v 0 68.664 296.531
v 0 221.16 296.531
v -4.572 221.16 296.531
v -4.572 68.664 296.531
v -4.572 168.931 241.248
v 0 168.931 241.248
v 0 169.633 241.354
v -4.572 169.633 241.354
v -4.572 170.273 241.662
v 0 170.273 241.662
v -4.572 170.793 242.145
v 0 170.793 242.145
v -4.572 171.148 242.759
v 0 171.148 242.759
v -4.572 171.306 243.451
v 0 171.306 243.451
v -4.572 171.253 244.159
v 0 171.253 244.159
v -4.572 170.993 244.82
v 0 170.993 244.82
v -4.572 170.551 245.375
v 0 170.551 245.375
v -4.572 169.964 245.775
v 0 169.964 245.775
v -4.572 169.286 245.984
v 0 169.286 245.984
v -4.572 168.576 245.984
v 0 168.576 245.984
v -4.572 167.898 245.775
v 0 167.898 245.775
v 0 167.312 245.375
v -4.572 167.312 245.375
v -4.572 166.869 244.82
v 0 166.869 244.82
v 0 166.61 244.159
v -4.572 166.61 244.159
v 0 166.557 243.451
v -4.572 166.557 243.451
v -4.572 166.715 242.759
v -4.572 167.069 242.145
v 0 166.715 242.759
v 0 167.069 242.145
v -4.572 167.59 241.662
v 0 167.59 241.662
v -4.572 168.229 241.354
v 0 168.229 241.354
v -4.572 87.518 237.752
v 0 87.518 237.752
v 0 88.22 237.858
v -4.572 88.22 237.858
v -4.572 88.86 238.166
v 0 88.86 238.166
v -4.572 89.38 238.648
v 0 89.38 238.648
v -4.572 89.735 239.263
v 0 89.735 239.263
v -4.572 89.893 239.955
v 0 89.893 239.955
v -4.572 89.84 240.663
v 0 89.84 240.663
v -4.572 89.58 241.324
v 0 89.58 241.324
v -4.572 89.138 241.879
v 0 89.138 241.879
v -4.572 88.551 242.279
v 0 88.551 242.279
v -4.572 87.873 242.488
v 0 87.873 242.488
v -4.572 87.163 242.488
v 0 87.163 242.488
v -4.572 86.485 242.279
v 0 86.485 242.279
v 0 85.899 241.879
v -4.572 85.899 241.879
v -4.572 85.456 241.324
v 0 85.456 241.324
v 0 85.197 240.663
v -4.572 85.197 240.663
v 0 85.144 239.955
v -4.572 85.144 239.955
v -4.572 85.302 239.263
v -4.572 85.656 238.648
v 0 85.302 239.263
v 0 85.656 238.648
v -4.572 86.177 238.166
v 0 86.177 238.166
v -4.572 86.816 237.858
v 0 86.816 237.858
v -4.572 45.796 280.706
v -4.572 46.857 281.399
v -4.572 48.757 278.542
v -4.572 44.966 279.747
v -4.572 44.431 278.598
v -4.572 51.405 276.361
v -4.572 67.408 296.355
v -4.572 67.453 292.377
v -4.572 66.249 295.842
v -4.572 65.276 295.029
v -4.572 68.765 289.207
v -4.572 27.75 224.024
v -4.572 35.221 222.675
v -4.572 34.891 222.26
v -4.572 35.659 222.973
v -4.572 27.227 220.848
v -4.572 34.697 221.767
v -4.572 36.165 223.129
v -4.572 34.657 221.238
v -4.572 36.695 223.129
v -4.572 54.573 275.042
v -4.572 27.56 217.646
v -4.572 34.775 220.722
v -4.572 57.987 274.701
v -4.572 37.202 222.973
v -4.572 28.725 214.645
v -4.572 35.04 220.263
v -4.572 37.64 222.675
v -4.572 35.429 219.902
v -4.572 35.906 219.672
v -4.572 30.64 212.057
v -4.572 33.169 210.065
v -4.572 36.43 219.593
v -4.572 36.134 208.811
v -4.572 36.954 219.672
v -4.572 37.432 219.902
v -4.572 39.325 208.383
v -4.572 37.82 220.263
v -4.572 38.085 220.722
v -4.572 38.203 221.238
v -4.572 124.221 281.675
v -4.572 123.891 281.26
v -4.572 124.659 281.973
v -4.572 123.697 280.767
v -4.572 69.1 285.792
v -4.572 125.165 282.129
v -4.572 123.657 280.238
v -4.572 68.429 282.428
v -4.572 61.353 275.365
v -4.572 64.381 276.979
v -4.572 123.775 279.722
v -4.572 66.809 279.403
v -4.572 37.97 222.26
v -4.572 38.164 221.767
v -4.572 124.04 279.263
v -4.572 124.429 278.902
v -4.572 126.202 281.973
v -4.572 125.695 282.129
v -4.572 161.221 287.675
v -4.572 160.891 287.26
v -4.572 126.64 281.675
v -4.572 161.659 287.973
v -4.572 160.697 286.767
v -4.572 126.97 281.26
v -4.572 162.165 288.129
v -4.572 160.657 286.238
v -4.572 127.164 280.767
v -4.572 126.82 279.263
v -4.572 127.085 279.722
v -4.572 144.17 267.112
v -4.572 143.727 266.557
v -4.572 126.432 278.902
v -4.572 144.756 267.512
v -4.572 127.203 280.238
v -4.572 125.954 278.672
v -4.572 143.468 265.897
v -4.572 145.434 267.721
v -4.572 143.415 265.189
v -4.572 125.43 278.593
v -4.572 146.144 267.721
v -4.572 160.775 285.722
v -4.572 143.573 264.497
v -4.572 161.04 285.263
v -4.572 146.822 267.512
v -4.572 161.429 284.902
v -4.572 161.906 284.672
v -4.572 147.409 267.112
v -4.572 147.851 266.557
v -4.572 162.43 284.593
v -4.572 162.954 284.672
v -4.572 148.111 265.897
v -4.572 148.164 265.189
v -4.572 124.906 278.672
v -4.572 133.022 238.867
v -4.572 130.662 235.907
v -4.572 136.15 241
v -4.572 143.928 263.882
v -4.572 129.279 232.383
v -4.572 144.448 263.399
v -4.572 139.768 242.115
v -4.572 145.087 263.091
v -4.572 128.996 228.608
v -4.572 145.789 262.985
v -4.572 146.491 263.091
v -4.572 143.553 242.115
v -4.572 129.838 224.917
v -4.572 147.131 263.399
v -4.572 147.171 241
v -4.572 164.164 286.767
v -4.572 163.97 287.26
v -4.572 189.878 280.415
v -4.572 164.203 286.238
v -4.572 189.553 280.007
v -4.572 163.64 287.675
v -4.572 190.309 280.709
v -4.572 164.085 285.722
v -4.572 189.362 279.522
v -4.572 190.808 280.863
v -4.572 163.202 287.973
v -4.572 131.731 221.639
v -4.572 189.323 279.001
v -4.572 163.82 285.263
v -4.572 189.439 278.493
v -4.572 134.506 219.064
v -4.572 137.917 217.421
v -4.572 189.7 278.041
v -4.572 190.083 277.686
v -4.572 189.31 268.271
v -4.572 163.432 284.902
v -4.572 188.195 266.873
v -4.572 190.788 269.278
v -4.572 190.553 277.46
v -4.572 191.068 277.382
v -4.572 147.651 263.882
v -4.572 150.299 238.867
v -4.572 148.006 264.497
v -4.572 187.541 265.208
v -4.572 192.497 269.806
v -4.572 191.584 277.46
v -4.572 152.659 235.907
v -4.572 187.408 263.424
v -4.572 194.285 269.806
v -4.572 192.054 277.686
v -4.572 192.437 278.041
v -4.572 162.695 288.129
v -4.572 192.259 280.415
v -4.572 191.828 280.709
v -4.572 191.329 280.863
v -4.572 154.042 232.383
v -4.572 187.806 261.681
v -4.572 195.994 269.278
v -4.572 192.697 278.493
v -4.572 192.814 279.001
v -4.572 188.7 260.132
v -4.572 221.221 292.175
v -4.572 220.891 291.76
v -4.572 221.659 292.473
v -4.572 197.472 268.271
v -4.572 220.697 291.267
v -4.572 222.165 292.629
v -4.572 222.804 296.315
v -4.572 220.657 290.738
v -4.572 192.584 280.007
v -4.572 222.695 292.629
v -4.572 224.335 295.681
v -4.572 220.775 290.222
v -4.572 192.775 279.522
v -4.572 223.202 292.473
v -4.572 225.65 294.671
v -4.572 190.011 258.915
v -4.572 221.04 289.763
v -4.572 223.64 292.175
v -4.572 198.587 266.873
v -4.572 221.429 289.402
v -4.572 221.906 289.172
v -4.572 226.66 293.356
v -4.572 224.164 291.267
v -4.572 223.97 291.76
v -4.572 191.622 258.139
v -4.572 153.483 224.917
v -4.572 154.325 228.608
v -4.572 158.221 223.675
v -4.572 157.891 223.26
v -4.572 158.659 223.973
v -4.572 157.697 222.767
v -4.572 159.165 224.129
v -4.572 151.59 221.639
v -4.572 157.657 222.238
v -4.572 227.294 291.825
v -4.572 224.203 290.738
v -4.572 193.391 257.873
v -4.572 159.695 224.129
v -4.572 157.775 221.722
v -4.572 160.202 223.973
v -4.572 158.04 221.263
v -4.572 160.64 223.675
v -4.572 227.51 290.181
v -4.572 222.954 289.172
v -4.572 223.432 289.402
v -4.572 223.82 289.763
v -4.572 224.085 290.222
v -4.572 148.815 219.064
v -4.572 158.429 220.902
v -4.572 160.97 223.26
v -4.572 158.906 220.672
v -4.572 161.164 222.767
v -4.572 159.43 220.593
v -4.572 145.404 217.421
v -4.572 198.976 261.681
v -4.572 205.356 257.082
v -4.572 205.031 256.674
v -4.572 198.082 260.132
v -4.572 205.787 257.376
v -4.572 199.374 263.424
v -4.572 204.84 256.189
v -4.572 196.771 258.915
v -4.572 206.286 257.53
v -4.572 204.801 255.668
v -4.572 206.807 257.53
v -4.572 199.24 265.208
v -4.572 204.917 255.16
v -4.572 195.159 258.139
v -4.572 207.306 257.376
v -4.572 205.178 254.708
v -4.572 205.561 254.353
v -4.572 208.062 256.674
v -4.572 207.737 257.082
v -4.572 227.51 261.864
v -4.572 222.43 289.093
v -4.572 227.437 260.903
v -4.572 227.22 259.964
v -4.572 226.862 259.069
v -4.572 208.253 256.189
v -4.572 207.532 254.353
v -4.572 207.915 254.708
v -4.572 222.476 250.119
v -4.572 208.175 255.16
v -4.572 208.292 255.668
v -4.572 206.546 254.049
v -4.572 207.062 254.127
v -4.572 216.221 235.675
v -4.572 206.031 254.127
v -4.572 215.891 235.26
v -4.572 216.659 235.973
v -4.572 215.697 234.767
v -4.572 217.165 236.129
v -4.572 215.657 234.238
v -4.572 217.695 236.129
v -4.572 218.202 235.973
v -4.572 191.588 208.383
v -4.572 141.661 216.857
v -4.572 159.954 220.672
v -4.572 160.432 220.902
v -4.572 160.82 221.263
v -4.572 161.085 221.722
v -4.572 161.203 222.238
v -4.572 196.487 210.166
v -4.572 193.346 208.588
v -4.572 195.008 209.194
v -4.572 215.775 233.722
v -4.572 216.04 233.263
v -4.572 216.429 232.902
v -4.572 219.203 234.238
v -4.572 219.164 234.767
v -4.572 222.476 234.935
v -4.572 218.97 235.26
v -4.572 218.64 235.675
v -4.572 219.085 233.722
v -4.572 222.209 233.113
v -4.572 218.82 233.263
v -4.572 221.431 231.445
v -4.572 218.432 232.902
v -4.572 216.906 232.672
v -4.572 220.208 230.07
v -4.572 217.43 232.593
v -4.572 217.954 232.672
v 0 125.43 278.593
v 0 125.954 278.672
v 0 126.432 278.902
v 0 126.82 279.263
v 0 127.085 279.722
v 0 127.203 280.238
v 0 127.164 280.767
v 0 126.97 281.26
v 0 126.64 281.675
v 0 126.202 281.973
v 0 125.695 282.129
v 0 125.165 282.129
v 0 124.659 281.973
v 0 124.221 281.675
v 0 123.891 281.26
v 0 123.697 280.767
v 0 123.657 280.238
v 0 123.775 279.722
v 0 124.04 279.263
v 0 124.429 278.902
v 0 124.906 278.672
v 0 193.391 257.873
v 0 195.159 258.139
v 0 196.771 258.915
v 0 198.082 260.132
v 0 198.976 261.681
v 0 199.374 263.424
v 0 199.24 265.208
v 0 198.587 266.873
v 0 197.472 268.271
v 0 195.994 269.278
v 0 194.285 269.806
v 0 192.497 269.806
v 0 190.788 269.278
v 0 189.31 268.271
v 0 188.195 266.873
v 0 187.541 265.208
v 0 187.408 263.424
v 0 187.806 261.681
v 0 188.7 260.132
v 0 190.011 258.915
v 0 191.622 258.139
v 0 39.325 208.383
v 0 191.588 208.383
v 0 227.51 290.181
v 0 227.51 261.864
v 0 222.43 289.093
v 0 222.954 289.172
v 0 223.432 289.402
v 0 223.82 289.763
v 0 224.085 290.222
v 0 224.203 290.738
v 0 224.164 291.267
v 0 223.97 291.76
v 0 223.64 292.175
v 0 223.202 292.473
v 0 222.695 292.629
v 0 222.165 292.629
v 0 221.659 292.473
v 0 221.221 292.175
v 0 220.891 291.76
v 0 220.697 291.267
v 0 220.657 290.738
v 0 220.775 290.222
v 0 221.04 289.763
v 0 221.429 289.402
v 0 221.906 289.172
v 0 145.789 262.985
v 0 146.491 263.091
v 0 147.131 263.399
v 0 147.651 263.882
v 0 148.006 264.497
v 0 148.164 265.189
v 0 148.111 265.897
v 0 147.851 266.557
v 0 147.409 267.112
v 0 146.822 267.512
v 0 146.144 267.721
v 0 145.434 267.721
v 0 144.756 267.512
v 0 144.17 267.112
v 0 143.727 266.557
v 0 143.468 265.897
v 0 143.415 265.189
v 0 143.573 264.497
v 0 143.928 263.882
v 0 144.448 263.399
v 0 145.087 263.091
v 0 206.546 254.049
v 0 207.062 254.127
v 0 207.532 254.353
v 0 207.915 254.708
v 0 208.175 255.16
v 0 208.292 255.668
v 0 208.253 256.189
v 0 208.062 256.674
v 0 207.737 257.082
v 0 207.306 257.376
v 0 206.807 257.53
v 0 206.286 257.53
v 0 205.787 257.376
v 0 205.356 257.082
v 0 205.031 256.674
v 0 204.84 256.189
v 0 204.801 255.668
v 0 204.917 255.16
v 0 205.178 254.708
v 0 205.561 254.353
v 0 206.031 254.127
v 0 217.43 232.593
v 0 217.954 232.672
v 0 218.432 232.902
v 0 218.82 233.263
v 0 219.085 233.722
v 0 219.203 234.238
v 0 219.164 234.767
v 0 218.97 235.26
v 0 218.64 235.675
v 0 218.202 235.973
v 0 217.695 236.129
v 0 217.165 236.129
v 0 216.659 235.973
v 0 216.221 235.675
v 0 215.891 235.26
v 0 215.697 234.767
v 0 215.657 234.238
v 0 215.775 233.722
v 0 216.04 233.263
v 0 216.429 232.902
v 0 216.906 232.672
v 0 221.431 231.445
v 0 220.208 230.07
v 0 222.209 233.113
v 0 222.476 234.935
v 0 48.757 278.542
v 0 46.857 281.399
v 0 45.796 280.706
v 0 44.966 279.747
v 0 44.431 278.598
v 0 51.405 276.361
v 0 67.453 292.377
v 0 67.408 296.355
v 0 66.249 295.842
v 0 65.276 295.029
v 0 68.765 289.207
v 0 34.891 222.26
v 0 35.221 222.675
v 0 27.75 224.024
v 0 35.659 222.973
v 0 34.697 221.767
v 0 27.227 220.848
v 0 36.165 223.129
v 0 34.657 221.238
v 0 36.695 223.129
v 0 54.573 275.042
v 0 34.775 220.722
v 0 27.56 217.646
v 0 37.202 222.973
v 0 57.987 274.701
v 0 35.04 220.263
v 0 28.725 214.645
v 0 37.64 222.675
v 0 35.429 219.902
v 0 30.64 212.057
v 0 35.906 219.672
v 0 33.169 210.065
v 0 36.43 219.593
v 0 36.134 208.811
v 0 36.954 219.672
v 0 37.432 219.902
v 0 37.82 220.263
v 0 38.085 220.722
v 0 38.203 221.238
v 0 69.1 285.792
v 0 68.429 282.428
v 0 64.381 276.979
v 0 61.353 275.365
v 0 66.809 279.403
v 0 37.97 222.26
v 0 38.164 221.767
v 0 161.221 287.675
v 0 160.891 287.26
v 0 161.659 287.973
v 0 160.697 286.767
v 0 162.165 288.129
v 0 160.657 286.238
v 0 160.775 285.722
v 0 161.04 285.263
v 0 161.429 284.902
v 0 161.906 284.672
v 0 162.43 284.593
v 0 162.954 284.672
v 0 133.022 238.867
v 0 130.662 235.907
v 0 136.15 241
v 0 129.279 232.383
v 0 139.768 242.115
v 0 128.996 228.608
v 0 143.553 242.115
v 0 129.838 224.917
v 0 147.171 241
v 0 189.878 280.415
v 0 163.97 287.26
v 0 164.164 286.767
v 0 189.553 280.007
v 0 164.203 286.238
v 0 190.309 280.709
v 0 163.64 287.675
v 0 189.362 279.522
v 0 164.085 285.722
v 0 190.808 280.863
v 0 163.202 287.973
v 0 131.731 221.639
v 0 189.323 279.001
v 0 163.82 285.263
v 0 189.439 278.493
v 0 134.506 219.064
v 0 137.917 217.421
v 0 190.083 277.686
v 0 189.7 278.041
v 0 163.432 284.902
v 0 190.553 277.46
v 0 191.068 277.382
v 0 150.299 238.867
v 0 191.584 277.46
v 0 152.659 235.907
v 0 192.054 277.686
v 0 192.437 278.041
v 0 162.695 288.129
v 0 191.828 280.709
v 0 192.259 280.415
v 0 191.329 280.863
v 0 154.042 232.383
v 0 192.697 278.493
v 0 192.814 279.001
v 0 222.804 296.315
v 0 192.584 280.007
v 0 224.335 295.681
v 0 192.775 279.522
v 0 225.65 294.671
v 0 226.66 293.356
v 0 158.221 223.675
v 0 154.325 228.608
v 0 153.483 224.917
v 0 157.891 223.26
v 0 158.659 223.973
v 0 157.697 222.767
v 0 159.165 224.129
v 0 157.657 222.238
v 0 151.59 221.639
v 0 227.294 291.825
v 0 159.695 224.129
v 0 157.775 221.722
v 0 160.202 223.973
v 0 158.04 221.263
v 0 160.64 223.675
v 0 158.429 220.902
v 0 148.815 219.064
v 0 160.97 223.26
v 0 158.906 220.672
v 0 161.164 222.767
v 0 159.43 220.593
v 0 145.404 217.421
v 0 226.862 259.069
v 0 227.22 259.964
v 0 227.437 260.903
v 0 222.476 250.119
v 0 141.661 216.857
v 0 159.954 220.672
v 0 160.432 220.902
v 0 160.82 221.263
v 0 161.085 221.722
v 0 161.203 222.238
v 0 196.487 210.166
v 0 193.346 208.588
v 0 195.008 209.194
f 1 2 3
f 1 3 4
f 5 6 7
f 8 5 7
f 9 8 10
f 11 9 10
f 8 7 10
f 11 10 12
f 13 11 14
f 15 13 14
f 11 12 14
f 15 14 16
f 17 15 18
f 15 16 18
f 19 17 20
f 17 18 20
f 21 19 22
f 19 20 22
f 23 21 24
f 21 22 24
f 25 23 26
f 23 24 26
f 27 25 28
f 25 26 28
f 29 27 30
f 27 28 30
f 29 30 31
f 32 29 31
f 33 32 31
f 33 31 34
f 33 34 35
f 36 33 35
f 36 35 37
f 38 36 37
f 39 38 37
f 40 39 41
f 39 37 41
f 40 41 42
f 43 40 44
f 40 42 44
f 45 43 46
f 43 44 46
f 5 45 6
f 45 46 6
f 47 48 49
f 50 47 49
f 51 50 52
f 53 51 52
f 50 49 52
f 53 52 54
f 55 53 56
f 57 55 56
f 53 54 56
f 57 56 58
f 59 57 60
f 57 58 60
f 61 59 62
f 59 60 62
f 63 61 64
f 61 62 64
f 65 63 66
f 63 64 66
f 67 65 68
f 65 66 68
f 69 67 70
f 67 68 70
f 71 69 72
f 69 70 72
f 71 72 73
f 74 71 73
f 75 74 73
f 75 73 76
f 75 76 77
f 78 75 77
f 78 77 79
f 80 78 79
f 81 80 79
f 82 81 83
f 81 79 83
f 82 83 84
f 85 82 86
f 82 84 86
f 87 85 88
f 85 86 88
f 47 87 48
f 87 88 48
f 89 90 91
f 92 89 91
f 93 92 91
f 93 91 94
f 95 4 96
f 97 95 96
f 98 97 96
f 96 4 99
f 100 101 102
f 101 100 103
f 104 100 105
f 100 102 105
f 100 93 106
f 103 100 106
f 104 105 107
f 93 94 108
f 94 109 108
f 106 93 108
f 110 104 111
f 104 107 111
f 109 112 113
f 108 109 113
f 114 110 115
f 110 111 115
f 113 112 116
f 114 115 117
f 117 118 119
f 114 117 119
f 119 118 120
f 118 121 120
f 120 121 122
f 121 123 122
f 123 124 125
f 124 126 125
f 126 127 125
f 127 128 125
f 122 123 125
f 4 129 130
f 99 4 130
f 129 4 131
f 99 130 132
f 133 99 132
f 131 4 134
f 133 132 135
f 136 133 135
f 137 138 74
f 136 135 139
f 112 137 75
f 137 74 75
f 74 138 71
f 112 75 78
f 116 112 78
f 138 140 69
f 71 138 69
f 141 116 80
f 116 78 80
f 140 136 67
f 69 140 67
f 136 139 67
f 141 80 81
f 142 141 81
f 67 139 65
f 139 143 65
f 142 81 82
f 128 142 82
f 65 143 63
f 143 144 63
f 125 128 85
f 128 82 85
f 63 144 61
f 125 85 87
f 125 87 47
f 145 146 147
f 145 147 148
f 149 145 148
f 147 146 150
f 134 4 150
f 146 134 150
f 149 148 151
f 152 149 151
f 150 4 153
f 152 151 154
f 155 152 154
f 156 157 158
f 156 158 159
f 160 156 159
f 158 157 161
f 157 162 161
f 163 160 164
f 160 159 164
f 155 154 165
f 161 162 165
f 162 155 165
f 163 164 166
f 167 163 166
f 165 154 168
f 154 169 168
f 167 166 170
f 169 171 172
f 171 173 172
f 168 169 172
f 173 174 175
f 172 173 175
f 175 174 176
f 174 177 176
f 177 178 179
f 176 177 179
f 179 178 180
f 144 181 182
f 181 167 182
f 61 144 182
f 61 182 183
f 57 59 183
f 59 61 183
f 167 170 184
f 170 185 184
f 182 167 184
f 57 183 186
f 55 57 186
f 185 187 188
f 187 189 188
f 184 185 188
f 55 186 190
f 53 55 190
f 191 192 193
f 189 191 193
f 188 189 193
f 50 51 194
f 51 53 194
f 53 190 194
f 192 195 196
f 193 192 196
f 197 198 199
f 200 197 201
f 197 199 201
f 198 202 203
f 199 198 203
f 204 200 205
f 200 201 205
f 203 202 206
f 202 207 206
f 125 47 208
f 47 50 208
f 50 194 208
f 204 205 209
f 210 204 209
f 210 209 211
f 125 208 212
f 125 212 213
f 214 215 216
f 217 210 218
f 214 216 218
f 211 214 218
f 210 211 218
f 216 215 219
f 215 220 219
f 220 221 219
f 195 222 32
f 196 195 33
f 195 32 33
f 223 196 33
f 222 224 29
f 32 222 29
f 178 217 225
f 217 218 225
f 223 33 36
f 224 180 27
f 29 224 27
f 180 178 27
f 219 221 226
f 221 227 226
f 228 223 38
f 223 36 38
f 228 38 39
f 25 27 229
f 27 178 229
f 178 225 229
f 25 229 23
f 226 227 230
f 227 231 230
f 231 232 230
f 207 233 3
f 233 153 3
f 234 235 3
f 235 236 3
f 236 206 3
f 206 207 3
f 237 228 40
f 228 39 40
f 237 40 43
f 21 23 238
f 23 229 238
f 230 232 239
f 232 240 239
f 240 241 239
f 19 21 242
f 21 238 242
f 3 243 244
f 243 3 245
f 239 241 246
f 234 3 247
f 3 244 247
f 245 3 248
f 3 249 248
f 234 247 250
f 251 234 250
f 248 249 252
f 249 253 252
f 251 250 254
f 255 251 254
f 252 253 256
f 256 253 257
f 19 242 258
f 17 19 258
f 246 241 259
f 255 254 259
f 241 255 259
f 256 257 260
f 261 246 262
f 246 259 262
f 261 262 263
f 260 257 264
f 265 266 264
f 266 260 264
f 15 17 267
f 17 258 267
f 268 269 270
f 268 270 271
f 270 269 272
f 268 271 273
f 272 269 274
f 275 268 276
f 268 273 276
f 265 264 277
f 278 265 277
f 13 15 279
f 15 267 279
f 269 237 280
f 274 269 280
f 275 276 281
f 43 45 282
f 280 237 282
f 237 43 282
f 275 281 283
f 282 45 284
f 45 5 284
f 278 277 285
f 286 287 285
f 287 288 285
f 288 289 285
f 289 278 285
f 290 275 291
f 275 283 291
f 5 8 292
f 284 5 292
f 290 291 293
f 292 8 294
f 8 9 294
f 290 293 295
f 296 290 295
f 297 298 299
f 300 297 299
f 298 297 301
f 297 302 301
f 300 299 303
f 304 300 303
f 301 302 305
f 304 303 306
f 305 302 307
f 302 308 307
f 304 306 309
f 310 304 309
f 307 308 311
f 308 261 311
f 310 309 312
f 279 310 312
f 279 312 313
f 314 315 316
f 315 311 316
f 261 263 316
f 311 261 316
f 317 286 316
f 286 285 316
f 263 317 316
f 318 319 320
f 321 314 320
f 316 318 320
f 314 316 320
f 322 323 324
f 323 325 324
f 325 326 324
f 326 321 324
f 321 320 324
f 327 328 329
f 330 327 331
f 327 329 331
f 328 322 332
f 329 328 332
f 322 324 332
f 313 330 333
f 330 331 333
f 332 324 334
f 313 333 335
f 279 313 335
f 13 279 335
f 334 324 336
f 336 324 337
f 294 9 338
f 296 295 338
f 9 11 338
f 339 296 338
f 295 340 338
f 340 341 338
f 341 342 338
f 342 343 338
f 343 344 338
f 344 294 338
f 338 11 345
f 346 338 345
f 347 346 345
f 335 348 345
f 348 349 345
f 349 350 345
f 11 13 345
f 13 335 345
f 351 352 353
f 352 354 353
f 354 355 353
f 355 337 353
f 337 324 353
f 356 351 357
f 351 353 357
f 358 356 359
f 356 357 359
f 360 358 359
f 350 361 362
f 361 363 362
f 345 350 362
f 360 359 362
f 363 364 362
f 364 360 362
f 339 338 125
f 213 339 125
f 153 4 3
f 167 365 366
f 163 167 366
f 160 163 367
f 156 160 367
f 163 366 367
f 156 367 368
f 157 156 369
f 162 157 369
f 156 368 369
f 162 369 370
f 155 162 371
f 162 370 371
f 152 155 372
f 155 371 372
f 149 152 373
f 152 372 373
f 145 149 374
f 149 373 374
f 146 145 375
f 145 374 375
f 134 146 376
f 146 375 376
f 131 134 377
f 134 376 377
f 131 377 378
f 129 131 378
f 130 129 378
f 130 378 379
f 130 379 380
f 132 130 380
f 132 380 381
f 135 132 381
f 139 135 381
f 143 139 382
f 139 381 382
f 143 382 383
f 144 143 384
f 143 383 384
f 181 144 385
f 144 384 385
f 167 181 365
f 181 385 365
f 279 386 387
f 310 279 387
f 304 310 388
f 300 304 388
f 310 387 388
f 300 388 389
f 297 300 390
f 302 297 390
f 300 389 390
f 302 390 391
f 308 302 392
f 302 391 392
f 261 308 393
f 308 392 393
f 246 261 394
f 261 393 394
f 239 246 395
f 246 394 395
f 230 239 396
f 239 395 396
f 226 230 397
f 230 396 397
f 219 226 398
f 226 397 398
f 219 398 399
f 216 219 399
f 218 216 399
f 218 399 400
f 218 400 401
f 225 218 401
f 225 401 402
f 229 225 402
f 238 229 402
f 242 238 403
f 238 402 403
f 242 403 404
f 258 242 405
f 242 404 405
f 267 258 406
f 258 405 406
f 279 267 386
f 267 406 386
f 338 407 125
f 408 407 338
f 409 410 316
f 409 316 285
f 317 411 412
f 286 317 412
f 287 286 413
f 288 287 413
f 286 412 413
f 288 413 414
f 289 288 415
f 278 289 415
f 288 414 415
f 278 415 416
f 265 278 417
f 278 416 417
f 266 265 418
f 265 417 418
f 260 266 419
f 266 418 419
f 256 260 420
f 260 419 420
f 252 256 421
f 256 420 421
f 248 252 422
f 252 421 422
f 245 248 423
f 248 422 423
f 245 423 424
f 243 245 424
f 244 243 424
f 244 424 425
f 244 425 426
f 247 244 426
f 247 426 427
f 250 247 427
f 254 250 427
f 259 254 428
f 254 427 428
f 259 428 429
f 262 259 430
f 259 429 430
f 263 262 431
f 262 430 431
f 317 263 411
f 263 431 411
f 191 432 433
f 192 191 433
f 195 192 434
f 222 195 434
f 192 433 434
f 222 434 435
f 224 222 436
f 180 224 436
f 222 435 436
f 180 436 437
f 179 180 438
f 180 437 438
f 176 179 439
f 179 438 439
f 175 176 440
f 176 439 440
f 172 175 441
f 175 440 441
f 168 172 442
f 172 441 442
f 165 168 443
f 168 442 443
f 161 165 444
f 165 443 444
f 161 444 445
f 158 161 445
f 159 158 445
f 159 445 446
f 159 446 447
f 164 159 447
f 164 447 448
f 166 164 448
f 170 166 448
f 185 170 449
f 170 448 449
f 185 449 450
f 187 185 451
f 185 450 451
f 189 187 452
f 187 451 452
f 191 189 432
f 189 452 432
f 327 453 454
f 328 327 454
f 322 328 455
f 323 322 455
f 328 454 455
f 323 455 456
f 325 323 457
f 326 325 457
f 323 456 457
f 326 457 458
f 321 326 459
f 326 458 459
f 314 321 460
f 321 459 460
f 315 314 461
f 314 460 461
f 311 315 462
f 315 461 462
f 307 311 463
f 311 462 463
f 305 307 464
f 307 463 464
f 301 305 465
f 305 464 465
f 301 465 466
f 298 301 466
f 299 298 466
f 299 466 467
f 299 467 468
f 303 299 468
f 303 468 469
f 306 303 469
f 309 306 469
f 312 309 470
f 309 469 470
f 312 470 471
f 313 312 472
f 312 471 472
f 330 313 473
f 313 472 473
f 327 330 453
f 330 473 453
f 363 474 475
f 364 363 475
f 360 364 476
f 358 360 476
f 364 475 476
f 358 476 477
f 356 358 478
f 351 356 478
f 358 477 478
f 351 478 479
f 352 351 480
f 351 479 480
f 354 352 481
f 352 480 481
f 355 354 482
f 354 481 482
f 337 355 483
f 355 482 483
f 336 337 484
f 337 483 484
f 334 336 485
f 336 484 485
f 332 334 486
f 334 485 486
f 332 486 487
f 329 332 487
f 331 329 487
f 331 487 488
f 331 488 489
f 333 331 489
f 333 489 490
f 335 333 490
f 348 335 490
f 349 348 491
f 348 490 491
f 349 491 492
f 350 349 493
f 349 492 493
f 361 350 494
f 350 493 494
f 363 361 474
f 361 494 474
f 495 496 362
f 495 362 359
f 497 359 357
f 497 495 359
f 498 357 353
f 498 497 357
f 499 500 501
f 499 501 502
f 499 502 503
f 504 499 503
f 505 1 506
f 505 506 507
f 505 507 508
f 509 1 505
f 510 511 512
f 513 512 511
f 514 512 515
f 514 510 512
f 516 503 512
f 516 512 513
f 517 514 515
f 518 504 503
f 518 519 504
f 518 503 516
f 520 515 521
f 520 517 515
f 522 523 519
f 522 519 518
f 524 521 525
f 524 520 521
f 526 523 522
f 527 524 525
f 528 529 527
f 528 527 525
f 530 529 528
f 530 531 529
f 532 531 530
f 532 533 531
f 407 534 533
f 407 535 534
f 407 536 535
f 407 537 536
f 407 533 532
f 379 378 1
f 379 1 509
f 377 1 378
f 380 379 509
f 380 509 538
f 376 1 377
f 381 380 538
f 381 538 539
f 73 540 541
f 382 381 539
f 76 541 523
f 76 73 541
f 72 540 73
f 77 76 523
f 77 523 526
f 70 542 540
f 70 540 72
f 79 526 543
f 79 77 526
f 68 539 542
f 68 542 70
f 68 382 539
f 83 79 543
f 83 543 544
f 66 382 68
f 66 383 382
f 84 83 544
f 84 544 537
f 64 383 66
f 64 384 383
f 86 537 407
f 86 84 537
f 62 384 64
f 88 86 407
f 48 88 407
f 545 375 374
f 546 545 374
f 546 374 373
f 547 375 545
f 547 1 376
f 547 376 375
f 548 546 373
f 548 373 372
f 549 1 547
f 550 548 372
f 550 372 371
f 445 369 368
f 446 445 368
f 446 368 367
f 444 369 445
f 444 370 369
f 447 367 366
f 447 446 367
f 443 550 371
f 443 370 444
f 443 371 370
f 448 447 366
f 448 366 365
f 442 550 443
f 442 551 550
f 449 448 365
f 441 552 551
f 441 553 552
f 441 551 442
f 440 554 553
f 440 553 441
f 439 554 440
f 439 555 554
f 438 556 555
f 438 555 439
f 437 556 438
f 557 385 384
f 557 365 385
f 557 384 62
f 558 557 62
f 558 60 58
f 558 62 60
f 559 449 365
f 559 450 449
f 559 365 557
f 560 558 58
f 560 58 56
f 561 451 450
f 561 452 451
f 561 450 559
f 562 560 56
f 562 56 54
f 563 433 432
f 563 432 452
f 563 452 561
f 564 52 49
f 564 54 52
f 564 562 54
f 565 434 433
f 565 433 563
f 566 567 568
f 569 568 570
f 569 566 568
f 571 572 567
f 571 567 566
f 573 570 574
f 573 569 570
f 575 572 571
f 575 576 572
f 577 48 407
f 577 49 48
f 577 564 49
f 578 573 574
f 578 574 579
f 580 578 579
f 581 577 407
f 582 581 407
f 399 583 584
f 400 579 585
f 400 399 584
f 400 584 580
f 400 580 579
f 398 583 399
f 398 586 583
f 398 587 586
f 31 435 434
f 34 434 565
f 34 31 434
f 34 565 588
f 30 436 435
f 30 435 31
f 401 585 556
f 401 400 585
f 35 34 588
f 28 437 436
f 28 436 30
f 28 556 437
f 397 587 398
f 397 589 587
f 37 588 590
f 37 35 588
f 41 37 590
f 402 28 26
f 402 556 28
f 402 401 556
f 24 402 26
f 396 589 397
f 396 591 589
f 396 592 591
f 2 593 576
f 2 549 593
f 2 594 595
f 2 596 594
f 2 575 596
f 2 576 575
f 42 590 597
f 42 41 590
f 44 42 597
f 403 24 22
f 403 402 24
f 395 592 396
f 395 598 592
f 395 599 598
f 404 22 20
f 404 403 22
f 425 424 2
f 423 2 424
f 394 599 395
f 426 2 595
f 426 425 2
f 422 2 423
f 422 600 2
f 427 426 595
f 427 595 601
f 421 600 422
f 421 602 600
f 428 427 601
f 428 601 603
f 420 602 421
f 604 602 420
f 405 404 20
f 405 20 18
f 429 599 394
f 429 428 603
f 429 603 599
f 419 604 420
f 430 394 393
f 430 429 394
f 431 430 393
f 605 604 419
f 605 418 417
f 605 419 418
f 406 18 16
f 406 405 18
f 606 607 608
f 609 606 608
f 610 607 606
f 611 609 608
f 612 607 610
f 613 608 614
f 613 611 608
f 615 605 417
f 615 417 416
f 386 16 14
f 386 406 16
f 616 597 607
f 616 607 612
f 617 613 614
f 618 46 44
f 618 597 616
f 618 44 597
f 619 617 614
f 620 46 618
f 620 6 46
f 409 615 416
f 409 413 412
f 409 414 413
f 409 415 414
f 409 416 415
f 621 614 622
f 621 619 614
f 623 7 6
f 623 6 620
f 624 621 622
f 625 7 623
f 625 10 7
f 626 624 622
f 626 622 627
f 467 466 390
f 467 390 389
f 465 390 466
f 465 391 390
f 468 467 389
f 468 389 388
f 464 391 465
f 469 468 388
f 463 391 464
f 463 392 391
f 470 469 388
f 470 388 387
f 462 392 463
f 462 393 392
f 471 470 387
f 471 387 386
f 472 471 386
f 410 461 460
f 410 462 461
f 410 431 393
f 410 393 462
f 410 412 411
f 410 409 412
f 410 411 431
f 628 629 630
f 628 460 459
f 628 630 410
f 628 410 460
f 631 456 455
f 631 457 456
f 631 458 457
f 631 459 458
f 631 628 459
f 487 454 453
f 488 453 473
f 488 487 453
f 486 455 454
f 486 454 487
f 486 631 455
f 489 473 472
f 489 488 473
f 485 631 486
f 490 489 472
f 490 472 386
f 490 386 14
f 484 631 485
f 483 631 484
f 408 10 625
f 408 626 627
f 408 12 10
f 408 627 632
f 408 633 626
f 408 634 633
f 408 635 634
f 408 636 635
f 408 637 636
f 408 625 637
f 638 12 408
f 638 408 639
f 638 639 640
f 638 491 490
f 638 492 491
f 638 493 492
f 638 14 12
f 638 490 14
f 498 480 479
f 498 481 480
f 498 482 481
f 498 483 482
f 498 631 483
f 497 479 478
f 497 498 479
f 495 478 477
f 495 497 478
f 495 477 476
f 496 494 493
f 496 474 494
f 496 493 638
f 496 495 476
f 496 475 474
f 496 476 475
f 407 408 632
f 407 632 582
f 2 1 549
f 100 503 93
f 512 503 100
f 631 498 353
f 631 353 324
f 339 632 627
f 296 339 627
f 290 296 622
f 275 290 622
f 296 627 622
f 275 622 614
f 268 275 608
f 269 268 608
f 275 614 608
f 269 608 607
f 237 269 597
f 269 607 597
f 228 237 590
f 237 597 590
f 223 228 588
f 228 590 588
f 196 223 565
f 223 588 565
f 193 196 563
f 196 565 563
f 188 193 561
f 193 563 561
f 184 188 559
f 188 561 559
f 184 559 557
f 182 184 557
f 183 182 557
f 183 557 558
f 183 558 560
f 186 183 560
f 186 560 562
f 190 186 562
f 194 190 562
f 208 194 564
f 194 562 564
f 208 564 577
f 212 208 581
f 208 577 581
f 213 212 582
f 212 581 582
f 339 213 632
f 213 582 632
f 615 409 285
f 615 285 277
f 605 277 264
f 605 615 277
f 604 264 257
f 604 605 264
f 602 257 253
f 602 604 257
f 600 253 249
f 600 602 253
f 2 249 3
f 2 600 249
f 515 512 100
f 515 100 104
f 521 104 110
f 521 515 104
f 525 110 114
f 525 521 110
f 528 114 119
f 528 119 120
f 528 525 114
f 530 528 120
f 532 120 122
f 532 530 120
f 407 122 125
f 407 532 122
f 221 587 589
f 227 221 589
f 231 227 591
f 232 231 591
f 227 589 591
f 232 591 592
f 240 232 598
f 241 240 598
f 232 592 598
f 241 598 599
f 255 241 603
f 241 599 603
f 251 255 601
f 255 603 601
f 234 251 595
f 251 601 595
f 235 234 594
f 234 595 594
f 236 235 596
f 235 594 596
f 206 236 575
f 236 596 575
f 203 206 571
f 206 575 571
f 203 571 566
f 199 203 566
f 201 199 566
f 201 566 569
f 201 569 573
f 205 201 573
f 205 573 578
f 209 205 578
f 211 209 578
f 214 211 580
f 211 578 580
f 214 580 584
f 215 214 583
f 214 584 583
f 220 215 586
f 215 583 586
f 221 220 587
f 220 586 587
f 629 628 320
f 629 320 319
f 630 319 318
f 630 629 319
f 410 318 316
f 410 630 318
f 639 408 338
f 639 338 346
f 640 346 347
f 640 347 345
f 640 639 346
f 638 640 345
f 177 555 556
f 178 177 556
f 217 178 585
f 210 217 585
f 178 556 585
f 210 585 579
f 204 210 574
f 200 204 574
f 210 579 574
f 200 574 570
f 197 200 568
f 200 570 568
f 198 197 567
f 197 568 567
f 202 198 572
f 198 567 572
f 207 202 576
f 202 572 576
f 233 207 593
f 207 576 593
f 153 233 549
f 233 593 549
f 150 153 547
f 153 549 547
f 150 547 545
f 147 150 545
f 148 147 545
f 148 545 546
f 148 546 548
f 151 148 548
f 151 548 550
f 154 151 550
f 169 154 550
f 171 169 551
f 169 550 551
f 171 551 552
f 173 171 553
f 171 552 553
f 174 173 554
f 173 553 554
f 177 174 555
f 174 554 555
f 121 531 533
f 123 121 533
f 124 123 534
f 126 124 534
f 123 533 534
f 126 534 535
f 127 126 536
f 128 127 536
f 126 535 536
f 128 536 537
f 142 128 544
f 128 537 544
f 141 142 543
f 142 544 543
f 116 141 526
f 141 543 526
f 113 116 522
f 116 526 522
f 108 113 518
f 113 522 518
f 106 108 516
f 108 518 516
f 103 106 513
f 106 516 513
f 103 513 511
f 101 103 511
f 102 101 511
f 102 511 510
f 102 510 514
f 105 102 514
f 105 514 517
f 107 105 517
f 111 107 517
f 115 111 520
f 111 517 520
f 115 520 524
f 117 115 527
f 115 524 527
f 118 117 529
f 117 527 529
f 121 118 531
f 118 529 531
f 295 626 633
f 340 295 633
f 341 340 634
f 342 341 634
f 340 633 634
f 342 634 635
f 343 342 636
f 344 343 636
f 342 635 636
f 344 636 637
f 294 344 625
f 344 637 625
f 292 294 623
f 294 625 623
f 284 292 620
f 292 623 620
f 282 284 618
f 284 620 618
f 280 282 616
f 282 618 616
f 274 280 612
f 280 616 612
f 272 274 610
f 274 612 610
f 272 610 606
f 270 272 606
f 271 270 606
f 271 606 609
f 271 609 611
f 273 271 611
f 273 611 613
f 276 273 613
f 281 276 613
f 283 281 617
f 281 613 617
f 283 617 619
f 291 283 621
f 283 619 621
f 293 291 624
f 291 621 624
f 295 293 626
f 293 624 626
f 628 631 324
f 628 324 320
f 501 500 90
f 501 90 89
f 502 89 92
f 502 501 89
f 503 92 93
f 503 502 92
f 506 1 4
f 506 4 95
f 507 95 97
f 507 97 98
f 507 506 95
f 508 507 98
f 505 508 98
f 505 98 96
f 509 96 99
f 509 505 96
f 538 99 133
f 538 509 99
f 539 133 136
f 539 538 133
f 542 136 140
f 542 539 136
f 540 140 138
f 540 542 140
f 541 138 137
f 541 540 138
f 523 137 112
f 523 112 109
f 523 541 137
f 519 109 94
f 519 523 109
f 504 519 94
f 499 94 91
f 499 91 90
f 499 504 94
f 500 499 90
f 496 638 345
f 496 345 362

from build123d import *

# Parameters (mm, degrees)
SKETCH4_R           = 12.7
SKETCH4_R_2         = 1.778
SKETCH4_R_3         = 2.38125
SKETCH4_R_4         = 1.75
SKETCH4_R_5         = 6
BOSS_EXTRUDE1_DEPTH = 4.572


with BuildPart() as part:
    # Sketch4 → Boss-Extrude1 (new body)
    with BuildSketch(Plane(origin=(0, 0, 0), x_dir=(0, 0, -1), z_dir=(1, 0, 0))):
        with BuildLine():
            Line((-278.598048041, 44.43052094), (-224.024344082, 27.750173837))
            ThreePointArc((-224.024344082, 27.750173837), (-213.286752868, 29.595855882), (-208.38308557, 39.325010744))
            Line((-208.38308557, 39.325010744), (-208.38308557, 191.588495768))
            ThreePointArc((-208.38308557, 191.588495768), (-208.8426278, 194.19468926), (-210.165826914, 196.486537353))
            Line((-210.165826914, 196.486537353), (-230.07024685, 220.207701322))
            ThreePointArc((-230.07024685, 220.207701322), (-232.251003102, 221.881054448), (-234.934629064, 222.476))
            Line((-234.934629064, 222.476), (-250.119258716, 222.476))
            Line((-250.119258716, 222.476), (-259.069094553, 226.862369804))
            ThreePointArc((-259.069094553, 226.862369804), (-260.42931468, 227.346249494), (-261.863679558, 227.510370624))
            Line((-261.863679558, 227.510370624), (-290.181258716, 227.510370624))
            ThreePointArc((-290.181258716, 227.510370624), (-294.671386777, 225.650498684), (-296.531258716, 221.160370624))
            Line((-296.531258716, 221.160370624), (-296.531258716, 68.663949573))
            ThreePointArc((-296.531258716, 68.663949573), (-296.13893545, 66.810982655), (-295.029296163, 65.276021876))
            ThreePointArc((-295.029296163, 65.276021876), (-276.979257712, 64.380634873), (-281.39899141, 46.857177452))
            ThreePointArc((-281.39899141, 46.857177452), (-280.255414168, 45.347331423), (-278.598048041, 44.43052094))
        make_face()
        with Locations((-229.557259723, 141.660587995)):
            Circle(SKETCH4_R, mode=Mode.SUBTRACT)
        with Locations((-221.371258716, 36.430370624)):
            Circle(SKETCH4_R_2, mode=Mode.SUBTRACT)
        with Locations((-243.629318942, 168.931188955)):
            Circle(SKETCH4_R_3, mode=Mode.SUBTRACT)
        with Locations((-280.371258716, 125.430370624)):
            Circle(SKETCH4_R_2, mode=Mode.SUBTRACT)
        with Locations((-286.371258716, 162.430370624)):
            Circle(SKETCH4_R_2, mode=Mode.SUBTRACT)
        with Locations((-279.132211518, 191.06840303)):
            Circle(SKETCH4_R_4, mode=Mode.SUBTRACT)
        with Locations((-255.799163122, 206.546414937)):
            Circle(SKETCH4_R_4, mode=Mode.SUBTRACT)
        with Locations((-263.872577413, 193.390808463)):
            Circle(SKETCH4_R_5, mode=Mode.SUBTRACT)
        with Locations((-290.871258716, 222.430370624)):
            Circle(SKETCH4_R_2, mode=Mode.SUBTRACT)
        with Locations((-234.371258716, 217.430370624)):
            Circle(SKETCH4_R_2, mode=Mode.SUBTRACT)
        with Locations((-222.371258716, 159.430370624)):
            Circle(SKETCH4_R_2, mode=Mode.SUBTRACT)
        with Locations((-265.366688027, 145.789251152)):
            Circle(SKETCH4_R_3, mode=Mode.SUBTRACT)
        with Locations((-240.13308557, 87.518200818)):
            Circle(SKETCH4_R_3, mode=Mode.SUBTRACT)
    extrude(amount=-BOSS_EXTRUDE1_DEPTH)


solid = part.part
